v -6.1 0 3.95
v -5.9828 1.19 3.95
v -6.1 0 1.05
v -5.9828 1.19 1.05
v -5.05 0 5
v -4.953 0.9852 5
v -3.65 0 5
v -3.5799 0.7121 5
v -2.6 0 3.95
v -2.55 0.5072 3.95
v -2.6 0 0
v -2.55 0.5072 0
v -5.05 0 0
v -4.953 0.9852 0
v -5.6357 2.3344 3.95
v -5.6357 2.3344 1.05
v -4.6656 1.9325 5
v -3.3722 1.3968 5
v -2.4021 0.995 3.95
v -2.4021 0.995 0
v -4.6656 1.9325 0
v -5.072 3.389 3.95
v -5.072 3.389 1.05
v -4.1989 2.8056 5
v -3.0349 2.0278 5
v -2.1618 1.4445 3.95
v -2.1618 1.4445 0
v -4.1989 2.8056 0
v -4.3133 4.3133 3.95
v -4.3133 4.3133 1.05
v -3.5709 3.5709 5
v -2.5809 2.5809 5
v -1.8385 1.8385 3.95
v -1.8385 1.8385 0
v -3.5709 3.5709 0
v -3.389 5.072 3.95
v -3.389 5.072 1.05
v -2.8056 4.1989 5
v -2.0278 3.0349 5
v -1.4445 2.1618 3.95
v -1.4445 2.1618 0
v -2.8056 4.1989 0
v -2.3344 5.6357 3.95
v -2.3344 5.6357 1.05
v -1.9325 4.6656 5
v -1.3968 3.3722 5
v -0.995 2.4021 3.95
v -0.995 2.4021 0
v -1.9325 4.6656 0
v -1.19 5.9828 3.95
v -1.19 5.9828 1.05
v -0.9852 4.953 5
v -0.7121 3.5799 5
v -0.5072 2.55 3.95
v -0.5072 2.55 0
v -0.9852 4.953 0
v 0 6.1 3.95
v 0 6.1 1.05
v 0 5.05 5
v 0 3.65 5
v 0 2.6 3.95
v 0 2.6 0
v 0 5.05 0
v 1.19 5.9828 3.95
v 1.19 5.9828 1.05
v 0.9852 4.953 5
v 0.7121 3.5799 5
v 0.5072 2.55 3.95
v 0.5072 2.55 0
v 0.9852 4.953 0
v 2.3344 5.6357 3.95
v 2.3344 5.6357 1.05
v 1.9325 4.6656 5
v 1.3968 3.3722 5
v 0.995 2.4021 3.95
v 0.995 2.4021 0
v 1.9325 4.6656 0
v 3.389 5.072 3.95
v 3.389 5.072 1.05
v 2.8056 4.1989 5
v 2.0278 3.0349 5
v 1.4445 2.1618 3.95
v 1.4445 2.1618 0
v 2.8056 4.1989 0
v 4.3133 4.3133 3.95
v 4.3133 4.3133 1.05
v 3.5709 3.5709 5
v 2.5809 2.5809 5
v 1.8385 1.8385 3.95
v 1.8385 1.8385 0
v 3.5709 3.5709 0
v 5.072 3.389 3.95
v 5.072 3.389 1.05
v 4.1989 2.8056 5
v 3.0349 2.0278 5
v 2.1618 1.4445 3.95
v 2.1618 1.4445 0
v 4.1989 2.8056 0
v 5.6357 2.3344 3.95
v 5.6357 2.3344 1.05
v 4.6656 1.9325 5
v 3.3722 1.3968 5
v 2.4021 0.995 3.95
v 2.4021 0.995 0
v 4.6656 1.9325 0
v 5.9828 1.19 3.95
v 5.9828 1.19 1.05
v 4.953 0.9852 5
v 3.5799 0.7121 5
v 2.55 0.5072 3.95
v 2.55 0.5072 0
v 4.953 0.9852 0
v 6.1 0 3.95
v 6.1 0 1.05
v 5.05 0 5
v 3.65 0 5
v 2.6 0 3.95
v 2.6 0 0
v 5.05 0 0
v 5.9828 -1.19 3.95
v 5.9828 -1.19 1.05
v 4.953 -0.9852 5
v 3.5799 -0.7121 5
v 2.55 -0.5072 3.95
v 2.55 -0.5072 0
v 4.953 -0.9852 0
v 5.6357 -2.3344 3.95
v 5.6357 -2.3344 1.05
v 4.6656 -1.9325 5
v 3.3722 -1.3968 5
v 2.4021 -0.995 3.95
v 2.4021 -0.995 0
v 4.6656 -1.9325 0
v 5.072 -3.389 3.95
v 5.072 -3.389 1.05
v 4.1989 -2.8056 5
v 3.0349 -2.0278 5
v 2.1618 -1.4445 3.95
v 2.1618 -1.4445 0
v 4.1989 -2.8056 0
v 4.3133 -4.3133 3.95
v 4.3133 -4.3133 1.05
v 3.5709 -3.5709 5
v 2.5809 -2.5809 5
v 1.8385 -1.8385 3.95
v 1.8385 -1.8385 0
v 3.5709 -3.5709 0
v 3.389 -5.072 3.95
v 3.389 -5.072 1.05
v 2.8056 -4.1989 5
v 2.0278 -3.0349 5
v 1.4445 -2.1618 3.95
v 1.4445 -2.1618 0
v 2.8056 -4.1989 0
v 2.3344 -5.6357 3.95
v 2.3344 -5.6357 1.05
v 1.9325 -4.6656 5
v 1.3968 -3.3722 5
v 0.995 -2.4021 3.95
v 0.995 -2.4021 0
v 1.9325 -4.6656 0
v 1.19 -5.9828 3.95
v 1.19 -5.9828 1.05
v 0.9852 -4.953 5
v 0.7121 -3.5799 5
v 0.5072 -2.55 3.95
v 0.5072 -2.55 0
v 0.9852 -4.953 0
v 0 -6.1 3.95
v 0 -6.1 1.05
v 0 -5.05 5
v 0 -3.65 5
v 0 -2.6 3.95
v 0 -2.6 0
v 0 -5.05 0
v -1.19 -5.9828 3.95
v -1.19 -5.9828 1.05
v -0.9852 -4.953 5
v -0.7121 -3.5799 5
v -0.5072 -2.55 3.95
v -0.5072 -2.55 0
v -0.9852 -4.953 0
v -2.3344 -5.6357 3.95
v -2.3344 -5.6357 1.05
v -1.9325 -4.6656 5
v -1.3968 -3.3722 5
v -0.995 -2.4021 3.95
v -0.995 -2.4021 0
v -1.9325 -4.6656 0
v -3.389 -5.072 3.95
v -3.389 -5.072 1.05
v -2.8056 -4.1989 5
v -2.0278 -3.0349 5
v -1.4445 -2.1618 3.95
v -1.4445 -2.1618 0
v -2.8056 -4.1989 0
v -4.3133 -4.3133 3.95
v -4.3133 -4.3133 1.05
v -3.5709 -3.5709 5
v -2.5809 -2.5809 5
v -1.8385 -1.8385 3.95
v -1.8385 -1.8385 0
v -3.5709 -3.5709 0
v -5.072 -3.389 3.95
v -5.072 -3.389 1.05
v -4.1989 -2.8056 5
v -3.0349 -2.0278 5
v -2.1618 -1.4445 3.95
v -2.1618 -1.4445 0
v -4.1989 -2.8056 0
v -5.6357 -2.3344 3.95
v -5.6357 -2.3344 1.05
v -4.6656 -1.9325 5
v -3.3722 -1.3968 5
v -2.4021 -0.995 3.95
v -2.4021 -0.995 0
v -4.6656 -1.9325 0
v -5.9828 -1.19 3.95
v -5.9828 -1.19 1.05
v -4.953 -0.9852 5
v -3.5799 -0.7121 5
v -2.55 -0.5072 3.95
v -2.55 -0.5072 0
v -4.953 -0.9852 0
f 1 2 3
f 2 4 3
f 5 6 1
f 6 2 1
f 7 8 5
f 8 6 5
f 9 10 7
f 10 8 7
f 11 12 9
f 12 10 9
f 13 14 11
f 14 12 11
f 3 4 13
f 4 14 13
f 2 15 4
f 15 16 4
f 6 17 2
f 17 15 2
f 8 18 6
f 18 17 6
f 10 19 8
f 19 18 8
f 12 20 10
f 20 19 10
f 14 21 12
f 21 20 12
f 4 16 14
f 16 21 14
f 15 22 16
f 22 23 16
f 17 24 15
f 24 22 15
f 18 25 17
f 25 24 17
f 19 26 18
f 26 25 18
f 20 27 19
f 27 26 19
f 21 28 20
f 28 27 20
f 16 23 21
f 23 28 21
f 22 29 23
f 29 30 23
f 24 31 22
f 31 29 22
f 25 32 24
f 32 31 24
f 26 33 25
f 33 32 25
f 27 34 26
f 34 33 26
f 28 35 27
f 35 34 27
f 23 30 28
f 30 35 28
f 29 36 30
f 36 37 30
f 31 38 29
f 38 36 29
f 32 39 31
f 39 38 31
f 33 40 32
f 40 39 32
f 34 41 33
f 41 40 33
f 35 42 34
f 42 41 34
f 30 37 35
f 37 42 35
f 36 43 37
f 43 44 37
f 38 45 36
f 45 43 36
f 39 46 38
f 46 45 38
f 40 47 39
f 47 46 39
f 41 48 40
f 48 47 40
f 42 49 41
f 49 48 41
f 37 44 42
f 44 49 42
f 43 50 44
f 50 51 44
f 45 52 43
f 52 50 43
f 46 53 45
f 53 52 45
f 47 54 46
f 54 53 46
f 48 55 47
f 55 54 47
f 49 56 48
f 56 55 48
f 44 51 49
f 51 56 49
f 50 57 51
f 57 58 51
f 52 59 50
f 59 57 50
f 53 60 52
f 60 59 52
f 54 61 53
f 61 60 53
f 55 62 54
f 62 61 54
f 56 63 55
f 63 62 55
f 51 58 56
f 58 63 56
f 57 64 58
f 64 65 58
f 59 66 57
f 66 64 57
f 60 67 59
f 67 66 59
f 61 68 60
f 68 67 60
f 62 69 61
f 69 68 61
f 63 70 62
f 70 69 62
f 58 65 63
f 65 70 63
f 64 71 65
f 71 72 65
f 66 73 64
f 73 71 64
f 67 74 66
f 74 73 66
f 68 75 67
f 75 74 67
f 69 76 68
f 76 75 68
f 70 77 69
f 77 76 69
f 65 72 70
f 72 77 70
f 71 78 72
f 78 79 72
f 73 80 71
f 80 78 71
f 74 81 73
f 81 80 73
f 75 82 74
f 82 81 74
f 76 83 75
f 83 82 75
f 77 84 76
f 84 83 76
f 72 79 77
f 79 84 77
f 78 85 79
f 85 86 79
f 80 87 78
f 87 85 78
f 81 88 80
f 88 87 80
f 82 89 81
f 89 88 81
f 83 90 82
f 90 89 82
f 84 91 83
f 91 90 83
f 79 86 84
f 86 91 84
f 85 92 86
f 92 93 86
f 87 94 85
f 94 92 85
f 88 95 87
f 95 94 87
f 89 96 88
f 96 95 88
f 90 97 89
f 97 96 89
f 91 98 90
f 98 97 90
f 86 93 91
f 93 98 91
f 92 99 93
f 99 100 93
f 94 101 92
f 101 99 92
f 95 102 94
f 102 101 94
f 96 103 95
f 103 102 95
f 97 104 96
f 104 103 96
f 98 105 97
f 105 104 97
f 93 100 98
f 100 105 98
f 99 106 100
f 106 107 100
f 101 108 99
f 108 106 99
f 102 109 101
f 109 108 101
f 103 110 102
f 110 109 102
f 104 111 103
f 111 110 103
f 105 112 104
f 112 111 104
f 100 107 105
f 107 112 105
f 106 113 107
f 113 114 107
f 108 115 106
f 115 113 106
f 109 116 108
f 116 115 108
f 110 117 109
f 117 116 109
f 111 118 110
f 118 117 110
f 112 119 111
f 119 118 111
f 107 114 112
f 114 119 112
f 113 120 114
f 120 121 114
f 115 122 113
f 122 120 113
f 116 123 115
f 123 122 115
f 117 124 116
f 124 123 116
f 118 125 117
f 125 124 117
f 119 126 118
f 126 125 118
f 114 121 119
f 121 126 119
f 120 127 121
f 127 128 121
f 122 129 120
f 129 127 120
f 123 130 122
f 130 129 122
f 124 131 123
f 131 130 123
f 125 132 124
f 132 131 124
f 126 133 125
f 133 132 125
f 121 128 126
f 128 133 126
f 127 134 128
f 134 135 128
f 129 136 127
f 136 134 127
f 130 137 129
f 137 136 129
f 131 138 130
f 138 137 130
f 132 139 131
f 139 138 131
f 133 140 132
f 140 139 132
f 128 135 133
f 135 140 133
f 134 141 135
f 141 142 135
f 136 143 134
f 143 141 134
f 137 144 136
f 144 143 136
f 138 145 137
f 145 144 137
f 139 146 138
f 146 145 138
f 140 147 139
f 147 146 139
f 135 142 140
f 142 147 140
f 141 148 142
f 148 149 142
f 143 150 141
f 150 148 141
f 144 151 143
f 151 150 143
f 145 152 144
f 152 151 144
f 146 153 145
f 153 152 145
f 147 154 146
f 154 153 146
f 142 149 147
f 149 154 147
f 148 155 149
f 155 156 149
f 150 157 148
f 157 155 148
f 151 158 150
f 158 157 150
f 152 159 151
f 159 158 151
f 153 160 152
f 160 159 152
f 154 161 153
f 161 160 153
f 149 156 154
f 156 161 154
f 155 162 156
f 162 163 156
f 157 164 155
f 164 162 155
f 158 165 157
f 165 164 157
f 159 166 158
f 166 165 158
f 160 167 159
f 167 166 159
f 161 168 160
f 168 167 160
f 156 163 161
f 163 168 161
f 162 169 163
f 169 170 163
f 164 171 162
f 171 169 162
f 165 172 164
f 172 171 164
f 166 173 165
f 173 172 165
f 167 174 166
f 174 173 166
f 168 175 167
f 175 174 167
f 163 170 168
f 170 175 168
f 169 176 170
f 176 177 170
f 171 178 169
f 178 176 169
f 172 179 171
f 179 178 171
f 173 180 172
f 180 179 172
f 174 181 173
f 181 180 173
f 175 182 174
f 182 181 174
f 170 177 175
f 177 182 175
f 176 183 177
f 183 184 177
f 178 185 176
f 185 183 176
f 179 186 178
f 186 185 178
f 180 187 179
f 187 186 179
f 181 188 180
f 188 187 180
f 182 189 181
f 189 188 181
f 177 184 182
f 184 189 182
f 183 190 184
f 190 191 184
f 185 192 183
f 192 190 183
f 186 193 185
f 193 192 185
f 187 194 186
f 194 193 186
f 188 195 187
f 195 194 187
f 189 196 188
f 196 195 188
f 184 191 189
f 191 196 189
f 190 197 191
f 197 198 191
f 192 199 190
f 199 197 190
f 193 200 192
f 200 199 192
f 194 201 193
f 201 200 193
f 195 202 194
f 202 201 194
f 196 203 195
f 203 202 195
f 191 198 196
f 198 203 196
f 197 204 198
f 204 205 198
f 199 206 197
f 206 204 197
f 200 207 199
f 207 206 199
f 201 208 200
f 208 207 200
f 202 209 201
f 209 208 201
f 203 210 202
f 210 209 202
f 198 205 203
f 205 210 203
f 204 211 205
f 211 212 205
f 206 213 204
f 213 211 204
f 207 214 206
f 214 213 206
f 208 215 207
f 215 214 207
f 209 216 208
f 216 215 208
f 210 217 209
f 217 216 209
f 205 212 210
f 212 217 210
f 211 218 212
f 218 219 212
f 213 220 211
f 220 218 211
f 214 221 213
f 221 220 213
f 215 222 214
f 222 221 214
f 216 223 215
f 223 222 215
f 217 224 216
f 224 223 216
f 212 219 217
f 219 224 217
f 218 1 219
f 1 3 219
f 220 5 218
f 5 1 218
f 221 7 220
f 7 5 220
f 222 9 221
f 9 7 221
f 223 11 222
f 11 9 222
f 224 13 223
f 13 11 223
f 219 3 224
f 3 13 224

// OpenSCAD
$fn = 32;

// ----------------------------------------------------------------------
// Form washer: chamfered washer, 12.2 mm outside, 5.2 mm bore
// ----------------------------------------------------------------------

// --- parameters (mm) ---
revolve_angle = 360;      // full turn around the Z axis
profile_points = 7;       // points of the closed outline

profile = [[2.6, 0], [5.05, 0], [6.1, 1.05], [6.1, 3.95], [5.05, 5], [3.65, 5], [2.6, 3.95]];  // single closed polygon, 7 points, counter clockwise

// --- the one profile operation ---
rotate_extrude(angle = revolve_angle) polygon(points = profile);
